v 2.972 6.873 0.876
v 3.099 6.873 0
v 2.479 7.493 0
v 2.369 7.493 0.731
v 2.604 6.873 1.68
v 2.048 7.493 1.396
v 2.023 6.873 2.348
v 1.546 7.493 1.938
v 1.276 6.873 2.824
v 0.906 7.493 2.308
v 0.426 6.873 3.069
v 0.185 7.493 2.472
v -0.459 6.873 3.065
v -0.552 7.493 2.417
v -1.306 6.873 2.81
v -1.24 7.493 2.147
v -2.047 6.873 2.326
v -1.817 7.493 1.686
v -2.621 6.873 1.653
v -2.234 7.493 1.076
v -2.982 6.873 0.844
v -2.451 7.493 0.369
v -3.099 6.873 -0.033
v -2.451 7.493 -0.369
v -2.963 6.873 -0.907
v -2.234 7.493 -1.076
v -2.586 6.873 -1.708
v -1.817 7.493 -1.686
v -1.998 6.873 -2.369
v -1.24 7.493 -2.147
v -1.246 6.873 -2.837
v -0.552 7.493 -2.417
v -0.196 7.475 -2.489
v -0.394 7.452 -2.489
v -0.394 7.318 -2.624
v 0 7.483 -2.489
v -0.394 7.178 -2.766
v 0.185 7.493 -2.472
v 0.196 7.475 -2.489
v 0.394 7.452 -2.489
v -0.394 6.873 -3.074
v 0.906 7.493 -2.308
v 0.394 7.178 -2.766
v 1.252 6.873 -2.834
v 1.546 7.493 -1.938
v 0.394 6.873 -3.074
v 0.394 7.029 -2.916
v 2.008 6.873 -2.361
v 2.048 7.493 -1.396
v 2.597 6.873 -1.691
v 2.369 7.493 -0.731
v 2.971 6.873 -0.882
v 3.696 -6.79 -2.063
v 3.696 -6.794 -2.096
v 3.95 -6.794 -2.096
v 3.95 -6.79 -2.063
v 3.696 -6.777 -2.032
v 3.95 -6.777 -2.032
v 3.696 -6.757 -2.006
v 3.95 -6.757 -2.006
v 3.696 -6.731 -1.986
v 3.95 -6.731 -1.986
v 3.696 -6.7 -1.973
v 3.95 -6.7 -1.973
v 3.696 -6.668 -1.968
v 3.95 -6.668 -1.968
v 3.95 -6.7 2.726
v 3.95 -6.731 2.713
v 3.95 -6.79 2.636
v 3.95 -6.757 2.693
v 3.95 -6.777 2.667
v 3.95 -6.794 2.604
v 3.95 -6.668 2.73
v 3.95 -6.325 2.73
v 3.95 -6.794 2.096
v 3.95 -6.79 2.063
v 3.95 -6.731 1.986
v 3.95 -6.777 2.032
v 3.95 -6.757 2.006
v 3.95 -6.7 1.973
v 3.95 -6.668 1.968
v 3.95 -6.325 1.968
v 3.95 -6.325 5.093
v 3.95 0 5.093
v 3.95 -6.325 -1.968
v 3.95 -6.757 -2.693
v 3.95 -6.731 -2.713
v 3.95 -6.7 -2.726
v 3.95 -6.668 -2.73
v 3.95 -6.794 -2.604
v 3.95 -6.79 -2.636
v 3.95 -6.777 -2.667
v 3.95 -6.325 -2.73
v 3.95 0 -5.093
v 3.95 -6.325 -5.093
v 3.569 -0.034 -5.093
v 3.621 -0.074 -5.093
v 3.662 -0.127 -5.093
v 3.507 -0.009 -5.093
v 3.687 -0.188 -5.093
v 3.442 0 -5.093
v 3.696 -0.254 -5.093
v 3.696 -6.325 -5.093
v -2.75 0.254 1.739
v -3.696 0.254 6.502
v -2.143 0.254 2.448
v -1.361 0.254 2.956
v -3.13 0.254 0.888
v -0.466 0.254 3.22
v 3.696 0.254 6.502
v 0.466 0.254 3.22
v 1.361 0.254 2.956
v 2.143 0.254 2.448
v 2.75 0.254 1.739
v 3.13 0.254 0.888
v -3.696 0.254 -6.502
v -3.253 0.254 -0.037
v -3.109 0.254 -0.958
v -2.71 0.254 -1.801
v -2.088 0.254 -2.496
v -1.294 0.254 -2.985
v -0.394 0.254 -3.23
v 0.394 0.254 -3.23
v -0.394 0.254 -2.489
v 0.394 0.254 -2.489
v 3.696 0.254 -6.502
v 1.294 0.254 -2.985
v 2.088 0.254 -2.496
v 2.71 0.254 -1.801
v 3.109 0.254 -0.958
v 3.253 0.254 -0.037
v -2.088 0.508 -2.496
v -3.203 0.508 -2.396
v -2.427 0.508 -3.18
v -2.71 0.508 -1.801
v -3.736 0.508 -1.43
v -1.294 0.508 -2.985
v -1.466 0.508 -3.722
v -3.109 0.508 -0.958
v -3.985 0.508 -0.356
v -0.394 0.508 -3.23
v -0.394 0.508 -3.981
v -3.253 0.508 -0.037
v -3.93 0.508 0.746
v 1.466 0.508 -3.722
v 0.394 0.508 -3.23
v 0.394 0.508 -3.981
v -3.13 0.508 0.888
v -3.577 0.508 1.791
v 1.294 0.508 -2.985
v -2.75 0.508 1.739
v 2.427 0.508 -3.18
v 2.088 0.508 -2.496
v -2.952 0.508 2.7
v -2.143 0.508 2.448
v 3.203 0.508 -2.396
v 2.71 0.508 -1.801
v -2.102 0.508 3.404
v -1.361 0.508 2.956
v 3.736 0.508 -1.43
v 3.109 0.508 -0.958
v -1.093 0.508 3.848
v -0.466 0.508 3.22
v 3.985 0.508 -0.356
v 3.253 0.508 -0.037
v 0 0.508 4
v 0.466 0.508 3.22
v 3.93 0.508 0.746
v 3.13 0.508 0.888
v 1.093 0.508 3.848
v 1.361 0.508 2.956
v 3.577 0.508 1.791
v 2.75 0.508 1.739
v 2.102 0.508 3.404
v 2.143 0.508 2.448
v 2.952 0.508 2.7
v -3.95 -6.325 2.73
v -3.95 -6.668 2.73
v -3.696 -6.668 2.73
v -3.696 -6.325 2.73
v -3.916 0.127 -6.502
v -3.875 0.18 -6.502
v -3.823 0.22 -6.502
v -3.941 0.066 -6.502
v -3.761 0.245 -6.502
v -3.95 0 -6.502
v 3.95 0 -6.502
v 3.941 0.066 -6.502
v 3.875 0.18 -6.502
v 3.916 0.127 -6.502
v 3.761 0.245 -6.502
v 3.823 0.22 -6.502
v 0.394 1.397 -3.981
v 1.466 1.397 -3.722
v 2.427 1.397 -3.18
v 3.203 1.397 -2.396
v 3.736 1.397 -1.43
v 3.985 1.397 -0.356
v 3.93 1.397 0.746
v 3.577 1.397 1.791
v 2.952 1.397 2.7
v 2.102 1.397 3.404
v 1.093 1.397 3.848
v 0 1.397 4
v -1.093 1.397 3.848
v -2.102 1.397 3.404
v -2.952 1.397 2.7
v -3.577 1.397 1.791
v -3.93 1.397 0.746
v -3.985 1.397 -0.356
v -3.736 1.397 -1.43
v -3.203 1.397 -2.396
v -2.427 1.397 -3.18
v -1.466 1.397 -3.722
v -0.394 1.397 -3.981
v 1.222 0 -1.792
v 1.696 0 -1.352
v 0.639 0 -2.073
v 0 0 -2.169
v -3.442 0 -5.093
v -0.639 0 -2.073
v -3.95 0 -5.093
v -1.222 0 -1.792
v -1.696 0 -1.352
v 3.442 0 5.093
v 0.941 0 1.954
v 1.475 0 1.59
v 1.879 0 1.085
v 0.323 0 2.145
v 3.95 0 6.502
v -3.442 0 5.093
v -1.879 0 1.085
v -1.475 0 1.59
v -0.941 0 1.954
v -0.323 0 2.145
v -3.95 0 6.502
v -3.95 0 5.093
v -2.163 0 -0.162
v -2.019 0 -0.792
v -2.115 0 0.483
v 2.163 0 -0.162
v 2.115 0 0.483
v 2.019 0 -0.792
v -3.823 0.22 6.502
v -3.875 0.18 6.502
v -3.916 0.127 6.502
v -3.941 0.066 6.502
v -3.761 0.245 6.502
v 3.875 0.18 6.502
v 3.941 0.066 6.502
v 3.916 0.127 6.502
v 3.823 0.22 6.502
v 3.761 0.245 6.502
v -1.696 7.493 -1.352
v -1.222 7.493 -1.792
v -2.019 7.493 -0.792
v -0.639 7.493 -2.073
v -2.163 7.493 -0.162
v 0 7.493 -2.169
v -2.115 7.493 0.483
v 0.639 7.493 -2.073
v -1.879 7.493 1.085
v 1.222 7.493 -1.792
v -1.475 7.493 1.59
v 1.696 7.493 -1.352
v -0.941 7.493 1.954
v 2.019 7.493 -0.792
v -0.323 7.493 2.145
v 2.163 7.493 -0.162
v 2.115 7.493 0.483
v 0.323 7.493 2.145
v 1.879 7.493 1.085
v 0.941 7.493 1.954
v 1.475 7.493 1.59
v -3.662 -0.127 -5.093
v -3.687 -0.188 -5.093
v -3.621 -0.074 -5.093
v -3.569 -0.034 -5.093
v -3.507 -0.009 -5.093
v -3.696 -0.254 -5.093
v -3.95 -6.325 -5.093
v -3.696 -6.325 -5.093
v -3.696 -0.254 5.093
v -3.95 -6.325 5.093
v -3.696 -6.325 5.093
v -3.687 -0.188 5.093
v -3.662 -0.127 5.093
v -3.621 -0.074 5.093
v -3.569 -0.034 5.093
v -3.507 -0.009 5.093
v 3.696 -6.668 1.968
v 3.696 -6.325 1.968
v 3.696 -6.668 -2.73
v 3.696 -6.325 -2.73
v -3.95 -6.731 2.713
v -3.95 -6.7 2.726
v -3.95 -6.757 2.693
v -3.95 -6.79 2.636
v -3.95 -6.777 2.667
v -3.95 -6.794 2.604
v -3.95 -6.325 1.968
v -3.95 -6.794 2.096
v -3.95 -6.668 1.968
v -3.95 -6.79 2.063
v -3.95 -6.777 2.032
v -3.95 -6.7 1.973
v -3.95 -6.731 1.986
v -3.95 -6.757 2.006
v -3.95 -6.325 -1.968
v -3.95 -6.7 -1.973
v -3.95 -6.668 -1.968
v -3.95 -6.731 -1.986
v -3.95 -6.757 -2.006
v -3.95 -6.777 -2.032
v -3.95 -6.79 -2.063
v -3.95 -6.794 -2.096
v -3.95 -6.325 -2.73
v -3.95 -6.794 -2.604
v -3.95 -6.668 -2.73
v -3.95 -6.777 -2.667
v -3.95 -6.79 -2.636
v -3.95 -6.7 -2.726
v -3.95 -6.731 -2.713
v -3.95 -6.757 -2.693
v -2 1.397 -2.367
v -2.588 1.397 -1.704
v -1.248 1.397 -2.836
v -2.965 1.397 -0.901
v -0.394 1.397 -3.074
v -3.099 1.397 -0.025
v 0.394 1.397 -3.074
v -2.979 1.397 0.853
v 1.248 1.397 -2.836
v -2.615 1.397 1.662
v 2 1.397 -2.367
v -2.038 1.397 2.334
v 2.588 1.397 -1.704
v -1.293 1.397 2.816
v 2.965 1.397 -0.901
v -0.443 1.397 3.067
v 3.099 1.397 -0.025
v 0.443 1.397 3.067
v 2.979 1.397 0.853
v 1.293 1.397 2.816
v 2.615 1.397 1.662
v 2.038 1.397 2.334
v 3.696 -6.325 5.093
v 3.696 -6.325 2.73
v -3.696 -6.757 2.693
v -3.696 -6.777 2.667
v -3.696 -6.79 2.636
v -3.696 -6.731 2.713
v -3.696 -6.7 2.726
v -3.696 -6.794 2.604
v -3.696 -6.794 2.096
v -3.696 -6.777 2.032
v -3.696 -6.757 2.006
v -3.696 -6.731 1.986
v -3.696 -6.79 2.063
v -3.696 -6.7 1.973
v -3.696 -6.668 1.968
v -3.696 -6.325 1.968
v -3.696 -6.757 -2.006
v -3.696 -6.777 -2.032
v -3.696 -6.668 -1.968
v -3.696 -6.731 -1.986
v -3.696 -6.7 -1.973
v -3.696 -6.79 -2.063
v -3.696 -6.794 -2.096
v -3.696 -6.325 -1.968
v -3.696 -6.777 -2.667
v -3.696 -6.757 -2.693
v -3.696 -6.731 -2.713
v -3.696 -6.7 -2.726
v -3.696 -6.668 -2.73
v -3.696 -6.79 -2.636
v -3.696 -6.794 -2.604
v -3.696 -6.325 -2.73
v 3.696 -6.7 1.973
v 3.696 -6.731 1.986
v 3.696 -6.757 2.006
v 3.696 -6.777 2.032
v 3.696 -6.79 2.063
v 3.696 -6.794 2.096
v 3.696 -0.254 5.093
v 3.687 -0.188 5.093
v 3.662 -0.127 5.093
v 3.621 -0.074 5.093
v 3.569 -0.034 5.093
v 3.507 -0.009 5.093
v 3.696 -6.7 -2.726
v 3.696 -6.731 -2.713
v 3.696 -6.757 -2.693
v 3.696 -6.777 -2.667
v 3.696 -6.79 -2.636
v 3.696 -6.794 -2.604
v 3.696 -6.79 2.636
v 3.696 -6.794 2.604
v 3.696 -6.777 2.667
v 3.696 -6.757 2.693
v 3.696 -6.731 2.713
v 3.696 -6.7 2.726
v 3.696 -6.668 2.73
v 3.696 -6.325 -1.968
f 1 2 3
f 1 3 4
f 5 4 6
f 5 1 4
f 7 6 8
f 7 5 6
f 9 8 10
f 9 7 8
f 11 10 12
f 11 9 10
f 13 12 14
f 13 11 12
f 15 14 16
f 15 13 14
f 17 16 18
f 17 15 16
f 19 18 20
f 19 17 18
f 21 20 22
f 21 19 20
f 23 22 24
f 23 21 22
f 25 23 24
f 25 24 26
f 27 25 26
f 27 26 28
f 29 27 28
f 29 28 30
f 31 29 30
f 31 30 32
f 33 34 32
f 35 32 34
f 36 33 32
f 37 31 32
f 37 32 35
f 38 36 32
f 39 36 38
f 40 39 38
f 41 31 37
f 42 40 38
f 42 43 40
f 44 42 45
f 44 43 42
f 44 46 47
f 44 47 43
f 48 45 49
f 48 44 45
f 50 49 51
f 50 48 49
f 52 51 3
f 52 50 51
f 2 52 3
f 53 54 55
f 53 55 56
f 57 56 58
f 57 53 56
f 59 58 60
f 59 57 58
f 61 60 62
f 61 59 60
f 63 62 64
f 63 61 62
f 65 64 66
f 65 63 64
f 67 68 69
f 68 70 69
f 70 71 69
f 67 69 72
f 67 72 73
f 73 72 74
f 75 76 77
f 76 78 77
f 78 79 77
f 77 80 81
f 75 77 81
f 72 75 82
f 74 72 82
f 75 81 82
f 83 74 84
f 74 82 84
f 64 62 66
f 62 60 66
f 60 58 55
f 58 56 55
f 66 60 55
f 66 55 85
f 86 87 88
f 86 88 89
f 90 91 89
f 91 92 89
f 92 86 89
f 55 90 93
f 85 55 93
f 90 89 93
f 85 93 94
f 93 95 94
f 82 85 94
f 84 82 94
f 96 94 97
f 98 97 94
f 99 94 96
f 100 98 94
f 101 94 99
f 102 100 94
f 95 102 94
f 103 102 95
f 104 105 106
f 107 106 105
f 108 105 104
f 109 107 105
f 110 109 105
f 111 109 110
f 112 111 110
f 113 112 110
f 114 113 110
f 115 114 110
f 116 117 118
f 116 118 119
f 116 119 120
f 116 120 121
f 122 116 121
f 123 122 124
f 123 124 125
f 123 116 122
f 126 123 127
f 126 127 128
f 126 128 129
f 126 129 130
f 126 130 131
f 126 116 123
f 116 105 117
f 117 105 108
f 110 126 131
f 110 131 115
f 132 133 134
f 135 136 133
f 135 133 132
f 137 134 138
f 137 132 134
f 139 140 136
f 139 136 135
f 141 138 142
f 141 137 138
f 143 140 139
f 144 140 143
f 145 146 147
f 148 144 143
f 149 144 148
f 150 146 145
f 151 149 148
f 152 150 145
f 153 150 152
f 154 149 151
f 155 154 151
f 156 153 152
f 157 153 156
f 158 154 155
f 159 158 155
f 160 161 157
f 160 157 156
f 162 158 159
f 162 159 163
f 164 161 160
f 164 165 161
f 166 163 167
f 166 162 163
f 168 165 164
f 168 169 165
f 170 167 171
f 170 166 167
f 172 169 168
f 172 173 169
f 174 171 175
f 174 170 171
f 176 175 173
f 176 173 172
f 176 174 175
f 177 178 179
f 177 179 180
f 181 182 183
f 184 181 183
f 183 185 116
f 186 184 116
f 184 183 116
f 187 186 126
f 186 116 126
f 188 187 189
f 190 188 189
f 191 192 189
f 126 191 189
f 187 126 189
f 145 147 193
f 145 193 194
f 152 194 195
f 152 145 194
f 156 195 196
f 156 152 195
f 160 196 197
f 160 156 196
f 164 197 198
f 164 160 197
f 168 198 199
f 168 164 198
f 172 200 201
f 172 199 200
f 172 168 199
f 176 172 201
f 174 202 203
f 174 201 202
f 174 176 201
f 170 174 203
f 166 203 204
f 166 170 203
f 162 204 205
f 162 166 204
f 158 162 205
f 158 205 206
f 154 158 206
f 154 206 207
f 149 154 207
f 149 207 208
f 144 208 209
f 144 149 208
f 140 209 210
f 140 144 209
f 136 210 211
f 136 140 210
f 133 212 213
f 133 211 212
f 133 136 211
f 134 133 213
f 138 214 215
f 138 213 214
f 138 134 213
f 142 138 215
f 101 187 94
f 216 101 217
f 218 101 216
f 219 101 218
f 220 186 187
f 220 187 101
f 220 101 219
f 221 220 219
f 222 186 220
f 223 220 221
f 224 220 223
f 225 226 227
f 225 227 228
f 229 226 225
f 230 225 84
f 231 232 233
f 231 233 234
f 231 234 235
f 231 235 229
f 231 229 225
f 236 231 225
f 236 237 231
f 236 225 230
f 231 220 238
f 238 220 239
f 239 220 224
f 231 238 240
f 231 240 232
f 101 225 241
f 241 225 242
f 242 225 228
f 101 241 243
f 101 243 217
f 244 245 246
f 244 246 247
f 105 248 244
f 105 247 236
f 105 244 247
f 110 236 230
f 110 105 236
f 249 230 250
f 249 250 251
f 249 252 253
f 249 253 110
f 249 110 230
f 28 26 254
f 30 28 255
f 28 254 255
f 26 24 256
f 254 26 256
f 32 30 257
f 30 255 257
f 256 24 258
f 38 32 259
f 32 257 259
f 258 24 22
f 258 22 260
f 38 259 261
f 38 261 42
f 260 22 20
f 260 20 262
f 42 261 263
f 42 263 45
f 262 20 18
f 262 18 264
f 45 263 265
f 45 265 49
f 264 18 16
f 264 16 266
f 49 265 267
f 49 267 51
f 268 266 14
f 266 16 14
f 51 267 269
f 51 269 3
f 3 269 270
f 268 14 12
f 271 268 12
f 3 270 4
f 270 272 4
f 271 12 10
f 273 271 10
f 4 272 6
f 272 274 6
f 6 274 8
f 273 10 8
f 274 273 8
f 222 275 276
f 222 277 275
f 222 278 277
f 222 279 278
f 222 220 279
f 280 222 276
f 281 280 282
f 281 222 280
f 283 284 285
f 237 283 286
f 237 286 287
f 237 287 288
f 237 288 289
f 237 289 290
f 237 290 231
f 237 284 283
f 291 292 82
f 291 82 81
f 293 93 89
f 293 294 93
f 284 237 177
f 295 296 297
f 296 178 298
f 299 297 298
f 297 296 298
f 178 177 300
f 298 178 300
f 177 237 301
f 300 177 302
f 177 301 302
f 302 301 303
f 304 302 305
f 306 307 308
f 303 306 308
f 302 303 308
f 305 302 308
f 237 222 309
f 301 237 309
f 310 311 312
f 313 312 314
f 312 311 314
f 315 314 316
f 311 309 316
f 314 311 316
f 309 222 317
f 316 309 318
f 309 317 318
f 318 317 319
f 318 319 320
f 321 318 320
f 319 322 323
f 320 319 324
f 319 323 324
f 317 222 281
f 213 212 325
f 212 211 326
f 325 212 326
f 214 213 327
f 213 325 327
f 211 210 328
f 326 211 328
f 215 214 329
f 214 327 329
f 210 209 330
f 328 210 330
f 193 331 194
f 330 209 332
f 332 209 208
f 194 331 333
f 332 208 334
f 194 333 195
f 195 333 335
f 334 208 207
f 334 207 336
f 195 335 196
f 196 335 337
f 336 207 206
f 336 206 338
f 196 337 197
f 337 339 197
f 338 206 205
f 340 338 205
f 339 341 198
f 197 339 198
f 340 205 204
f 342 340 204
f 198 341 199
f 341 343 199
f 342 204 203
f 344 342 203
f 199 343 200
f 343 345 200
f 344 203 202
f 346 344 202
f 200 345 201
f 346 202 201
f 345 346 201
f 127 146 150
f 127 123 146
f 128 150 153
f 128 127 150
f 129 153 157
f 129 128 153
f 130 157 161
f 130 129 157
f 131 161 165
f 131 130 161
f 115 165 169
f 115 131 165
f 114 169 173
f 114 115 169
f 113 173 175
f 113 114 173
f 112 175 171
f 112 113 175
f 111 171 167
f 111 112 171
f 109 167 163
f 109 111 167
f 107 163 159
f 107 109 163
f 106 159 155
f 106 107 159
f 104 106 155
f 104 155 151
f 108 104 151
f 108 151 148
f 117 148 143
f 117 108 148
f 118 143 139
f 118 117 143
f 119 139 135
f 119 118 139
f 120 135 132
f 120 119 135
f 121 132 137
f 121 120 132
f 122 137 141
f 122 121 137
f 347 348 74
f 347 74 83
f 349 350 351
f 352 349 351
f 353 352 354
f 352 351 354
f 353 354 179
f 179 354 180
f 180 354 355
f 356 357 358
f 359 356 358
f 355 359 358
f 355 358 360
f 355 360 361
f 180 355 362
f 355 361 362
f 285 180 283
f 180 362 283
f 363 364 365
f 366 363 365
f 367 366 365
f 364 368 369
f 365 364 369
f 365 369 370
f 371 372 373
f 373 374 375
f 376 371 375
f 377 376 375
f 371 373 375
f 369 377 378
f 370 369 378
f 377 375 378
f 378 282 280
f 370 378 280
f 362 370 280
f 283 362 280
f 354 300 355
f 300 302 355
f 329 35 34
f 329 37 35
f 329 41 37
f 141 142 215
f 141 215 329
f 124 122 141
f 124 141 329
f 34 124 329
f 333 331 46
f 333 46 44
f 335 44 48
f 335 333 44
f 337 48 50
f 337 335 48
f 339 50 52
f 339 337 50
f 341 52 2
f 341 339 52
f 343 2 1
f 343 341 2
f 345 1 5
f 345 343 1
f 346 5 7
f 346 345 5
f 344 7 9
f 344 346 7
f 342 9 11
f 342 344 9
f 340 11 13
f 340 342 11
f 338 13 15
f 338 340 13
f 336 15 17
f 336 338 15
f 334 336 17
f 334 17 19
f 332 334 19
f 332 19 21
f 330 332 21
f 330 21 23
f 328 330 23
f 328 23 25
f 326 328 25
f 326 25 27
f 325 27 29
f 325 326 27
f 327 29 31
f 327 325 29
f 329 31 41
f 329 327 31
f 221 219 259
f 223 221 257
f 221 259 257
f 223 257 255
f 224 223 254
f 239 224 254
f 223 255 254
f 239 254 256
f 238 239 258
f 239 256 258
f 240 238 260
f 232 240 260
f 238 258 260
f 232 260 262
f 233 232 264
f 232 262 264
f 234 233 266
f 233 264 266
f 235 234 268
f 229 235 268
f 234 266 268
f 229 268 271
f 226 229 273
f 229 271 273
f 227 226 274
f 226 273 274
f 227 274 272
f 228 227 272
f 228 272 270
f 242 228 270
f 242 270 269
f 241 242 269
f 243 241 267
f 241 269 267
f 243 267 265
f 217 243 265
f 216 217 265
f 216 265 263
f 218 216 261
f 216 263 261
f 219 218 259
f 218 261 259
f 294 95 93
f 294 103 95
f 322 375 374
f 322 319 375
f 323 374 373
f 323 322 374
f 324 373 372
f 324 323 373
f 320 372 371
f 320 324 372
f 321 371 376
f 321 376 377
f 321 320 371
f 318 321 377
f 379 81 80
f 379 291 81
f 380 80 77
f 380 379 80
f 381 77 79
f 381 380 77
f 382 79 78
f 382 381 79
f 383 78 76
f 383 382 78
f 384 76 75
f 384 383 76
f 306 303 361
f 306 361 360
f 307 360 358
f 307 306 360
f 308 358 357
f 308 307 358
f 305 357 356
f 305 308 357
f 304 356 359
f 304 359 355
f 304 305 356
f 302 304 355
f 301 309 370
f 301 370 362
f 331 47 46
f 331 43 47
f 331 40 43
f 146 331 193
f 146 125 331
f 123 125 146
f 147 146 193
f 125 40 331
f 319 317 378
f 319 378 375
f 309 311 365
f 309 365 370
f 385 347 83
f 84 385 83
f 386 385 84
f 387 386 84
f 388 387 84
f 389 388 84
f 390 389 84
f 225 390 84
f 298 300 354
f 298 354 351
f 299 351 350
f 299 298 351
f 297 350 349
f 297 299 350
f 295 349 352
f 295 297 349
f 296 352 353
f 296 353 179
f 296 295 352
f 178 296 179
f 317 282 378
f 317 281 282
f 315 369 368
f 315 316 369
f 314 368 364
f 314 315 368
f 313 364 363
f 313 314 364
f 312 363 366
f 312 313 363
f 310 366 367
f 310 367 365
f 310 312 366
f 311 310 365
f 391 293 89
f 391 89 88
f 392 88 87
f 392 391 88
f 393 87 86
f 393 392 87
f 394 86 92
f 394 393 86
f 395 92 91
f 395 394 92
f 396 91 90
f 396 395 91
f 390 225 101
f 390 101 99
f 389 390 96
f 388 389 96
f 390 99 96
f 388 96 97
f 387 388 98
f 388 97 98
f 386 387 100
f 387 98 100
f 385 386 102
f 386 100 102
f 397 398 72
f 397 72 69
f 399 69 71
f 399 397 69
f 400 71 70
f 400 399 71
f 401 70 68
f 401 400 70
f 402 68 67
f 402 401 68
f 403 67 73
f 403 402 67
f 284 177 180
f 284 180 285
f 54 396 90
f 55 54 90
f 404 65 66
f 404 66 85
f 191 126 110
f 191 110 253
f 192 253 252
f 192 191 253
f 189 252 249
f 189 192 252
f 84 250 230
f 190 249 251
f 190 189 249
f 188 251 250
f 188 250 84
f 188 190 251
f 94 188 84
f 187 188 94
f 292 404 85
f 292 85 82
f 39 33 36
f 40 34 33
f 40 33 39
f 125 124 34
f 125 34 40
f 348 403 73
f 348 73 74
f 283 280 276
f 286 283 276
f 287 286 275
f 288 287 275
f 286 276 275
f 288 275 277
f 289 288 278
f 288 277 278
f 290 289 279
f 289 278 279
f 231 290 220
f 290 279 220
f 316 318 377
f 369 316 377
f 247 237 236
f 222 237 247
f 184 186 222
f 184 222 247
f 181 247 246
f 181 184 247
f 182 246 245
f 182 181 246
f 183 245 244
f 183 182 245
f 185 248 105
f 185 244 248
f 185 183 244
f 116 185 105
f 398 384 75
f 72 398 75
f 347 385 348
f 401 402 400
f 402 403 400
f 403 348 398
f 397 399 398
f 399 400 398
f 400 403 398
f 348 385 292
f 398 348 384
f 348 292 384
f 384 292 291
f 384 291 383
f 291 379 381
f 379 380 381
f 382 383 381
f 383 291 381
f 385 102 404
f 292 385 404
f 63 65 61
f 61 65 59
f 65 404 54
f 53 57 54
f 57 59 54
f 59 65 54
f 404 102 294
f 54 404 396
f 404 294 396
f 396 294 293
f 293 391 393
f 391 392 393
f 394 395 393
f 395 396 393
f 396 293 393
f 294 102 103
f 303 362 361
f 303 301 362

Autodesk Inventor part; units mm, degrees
sketch "Sketch_1" plane through (0, 0, 0) normal (0, 0, 1) x (1, 0, 0)
  line L0 (-3.9497, 0) -> (-3.9497, -6.7945)
  line L1 (-3.9497, -6.7945) -> (-3.6957, -6.7945)
  line L2 (-3.6957, -6.7945) -> (-3.6957, -0.254)
  arc A0 (-3.4417, 0) -> (-3.6957, -0.254) centre (-3.4417, -0.254) ccw
  line L3 (-3.4417, 0) -> (3.4417, 0)
  arc A1 (3.6957, -0.254) -> (3.4417, 0) centre (3.4417, -0.254) ccw
  line L4 (3.6957, -0.254) -> (3.6957, -6.7945)
  line L5 (3.6957, -6.7945) -> (3.9497, -6.7945)
  line L6 (3.9497, -6.7945) -> (3.9497, 0)
  arc A2 (3.9497, 0) -> (3.6957, 0.254) centre (3.6957, 0) ccw
  line L7 (3.6957, 0.254) -> (-3.6957, 0.254)
  arc A3 (-3.6957, 0.254) -> (-3.9497, 0) centre (-3.6957, 0) ccw
extrude "Extrusion1" add sketch "Sketch_1" along normal mid plane 13.0048
sketch "Sketch_2" plane through (0, 0, 0) normal (1, 0, 0) x (0, 1, 0)
  line L0 (0, 7.8029) -> (-9.398, 7.8029)
  line L1 (-9.398, 7.8029) -> (-9.398, -7.8029)
  line L2 (-9.398, -7.8029) -> (0, -7.8029)
  line L3 (0, -7.8029) -> (0, -5.0927)
  line L4 (0, -5.0927) -> (-6.3246, -5.0927)
  line L5 (-6.3246, -5.0927) -> (-6.3246, -2.7305)
  line L6 (-6.3246, -2.7305) -> (-6.6675, -2.7305)
  arc A0 (-6.7945, -2.6035) -> (-6.6675, -2.7305) centre (-6.6675, -2.6035) ccw
  line L7 (-6.7945, -2.6035) -> (-6.7945, -2.0955)
  arc A1 (-6.6675, -1.9685) -> (-6.7945, -2.0955) centre (-6.6675, -2.0955) ccw
  line L8 (-6.6675, -1.9685) -> (-6.3246, -1.9685)
  line L9 (-6.3246, -1.9685) -> (-6.3246, 1.9685)
  line L10 (-6.3246, 1.9685) -> (-6.6675, 1.9685)
  arc A2 (-6.7945, 2.0955) -> (-6.6675, 1.9685) centre (-6.6675, 2.0955) ccw
  line L11 (-6.7945, 2.0955) -> (-6.7945, 2.6035)
  arc A3 (-6.6675, 2.7305) -> (-6.7945, 2.6035) centre (-6.6675, 2.6035) ccw
  line L12 (-6.6675, 2.7305) -> (-6.3246, 2.7305)
  line L13 (-6.3246, 2.7305) -> (-6.3246, 5.0927)
  line L14 (-6.3246, 5.0927) -> (0, 5.0927)
  line L15 (0, 5.0927) -> (0, 7.8029)
extrude "Extrusion2" cut sketch "Sketch_2" along normal mid plane 7.8994
sketch "Sketch_7" plane through (0, 0, 0) normal (0, 0, 1) x (1, 0, 0)
  line L0 (0, 0.127) -> (0, 7.493)
  line L1 (0, 7.493) -> (2.479, 7.493)
  line L2 (2.479, 7.493) -> (3.0988, 6.8732)
  line L3 (3.0988, 6.8732) -> (3.0988, 1.397)
  line L4 (3.0988, 1.397) -> (4.0005, 1.397)
  line L5 (4.0005, 1.397) -> (4.0005, 0.508)
  line L6 (4.0005, 0.508) -> (3.2537, 0.508)
  line L7 (3.2537, 0.508) -> (3.2537, 0.127)
  line L8 (3.2537, 0.127) -> (0, 0.127)
  line L9 (0, 0.127) -> (0, 7.493)
revolve "Revolution1" add sketch "Sketch_7" angle 360 about axis through (0, 0.127, 0) along (0, -1, 0)
sketch "Sketch_8" plane through (0, 0.254, 0) normal (0, 1, 0) x (1, 0, 0)
  line L0 (-0.3937, 2.4892) -> (0.3937, 2.4892)
  line L1 (0.3937, 2.4892) -> (0.3937, 10.4902)
  line L2 (0.3937, 10.4902) -> (-0.3937, 10.4902)
  line L3 (-0.3937, 10.4902) -> (-0.3937, 2.4892)
extrude "Extrusion3" cut sketch "Sketch_8" along normal blind 7.8232
sketch "Sketch5" plane through (-3.9497, 0, -6.5024) normal (0, -1, 0) x (1, 0, 0)
  point P0 (3.9497, 6.5024)
hole "Drilling 1" at (0, 0, 0) direction (0, 1, 0) diameter 4.3383 depth 7.747
ref_plane "1_XY" through (0, 5.6896, 0) normal (0, 1, 0) x (1, 0, 0)
ref_plane "1_YZ" through (0, 5.6896, 0) normal (1, 0, 0) x (0, 0, -1)
ref_plane "1_ZX" through (0, 5.6896, 0) normal (0, 0, -1) x (0, 1, 0)
ref_plane "2_XY" through (0, 4.2672, 0) normal (0, 1, 0) x (1, 0, 0)
ref_plane "2_YZ" through (0, 4.2672, 0) normal (1, 0, 0) x (0, 0, -1)
ref_plane "2_ZX" through (0, 4.2672, 0) normal (0, 0, -1) x (0, 1, 0)
ref_plane "3_XY" through (0, 2.8448, 0) normal (0, 1, 0) x (1, 0, 0)
ref_plane "3_YZ" through (0, 2.8448, 0) normal (1, 0, 0) x (0, 0, -1)
ref_plane "3_ZX" through (0, 2.8448, 0) normal (0, 0, -1) x (0, 1, 0)
ref_plane "4_XY" through (0, 1.778, 0) normal (0, 1, 0) x (1, 0, 0)
ref_plane "4_YZ" through (0, 1.778, 0) normal (1, 0, 0) x (0, 0, -1)
ref_plane "4_ZX" through (0, 1.778, 0) normal (0, 0, -1) x (0, 1, 0)
ref_plane "to_base_XY" through (0, 0, 0) normal (0, 1, 0) x (1, 0, 0)
ref_plane "to_base_YZ" through (0, 0, 0) normal (1, 0, 0) x (0, 0, -1)
ref_plane "to_base_ZX" through (0, 0, 0) normal (0, 0, -1) x (0, 1, 0)
properties part number "M201A2M201BR-bushing"
